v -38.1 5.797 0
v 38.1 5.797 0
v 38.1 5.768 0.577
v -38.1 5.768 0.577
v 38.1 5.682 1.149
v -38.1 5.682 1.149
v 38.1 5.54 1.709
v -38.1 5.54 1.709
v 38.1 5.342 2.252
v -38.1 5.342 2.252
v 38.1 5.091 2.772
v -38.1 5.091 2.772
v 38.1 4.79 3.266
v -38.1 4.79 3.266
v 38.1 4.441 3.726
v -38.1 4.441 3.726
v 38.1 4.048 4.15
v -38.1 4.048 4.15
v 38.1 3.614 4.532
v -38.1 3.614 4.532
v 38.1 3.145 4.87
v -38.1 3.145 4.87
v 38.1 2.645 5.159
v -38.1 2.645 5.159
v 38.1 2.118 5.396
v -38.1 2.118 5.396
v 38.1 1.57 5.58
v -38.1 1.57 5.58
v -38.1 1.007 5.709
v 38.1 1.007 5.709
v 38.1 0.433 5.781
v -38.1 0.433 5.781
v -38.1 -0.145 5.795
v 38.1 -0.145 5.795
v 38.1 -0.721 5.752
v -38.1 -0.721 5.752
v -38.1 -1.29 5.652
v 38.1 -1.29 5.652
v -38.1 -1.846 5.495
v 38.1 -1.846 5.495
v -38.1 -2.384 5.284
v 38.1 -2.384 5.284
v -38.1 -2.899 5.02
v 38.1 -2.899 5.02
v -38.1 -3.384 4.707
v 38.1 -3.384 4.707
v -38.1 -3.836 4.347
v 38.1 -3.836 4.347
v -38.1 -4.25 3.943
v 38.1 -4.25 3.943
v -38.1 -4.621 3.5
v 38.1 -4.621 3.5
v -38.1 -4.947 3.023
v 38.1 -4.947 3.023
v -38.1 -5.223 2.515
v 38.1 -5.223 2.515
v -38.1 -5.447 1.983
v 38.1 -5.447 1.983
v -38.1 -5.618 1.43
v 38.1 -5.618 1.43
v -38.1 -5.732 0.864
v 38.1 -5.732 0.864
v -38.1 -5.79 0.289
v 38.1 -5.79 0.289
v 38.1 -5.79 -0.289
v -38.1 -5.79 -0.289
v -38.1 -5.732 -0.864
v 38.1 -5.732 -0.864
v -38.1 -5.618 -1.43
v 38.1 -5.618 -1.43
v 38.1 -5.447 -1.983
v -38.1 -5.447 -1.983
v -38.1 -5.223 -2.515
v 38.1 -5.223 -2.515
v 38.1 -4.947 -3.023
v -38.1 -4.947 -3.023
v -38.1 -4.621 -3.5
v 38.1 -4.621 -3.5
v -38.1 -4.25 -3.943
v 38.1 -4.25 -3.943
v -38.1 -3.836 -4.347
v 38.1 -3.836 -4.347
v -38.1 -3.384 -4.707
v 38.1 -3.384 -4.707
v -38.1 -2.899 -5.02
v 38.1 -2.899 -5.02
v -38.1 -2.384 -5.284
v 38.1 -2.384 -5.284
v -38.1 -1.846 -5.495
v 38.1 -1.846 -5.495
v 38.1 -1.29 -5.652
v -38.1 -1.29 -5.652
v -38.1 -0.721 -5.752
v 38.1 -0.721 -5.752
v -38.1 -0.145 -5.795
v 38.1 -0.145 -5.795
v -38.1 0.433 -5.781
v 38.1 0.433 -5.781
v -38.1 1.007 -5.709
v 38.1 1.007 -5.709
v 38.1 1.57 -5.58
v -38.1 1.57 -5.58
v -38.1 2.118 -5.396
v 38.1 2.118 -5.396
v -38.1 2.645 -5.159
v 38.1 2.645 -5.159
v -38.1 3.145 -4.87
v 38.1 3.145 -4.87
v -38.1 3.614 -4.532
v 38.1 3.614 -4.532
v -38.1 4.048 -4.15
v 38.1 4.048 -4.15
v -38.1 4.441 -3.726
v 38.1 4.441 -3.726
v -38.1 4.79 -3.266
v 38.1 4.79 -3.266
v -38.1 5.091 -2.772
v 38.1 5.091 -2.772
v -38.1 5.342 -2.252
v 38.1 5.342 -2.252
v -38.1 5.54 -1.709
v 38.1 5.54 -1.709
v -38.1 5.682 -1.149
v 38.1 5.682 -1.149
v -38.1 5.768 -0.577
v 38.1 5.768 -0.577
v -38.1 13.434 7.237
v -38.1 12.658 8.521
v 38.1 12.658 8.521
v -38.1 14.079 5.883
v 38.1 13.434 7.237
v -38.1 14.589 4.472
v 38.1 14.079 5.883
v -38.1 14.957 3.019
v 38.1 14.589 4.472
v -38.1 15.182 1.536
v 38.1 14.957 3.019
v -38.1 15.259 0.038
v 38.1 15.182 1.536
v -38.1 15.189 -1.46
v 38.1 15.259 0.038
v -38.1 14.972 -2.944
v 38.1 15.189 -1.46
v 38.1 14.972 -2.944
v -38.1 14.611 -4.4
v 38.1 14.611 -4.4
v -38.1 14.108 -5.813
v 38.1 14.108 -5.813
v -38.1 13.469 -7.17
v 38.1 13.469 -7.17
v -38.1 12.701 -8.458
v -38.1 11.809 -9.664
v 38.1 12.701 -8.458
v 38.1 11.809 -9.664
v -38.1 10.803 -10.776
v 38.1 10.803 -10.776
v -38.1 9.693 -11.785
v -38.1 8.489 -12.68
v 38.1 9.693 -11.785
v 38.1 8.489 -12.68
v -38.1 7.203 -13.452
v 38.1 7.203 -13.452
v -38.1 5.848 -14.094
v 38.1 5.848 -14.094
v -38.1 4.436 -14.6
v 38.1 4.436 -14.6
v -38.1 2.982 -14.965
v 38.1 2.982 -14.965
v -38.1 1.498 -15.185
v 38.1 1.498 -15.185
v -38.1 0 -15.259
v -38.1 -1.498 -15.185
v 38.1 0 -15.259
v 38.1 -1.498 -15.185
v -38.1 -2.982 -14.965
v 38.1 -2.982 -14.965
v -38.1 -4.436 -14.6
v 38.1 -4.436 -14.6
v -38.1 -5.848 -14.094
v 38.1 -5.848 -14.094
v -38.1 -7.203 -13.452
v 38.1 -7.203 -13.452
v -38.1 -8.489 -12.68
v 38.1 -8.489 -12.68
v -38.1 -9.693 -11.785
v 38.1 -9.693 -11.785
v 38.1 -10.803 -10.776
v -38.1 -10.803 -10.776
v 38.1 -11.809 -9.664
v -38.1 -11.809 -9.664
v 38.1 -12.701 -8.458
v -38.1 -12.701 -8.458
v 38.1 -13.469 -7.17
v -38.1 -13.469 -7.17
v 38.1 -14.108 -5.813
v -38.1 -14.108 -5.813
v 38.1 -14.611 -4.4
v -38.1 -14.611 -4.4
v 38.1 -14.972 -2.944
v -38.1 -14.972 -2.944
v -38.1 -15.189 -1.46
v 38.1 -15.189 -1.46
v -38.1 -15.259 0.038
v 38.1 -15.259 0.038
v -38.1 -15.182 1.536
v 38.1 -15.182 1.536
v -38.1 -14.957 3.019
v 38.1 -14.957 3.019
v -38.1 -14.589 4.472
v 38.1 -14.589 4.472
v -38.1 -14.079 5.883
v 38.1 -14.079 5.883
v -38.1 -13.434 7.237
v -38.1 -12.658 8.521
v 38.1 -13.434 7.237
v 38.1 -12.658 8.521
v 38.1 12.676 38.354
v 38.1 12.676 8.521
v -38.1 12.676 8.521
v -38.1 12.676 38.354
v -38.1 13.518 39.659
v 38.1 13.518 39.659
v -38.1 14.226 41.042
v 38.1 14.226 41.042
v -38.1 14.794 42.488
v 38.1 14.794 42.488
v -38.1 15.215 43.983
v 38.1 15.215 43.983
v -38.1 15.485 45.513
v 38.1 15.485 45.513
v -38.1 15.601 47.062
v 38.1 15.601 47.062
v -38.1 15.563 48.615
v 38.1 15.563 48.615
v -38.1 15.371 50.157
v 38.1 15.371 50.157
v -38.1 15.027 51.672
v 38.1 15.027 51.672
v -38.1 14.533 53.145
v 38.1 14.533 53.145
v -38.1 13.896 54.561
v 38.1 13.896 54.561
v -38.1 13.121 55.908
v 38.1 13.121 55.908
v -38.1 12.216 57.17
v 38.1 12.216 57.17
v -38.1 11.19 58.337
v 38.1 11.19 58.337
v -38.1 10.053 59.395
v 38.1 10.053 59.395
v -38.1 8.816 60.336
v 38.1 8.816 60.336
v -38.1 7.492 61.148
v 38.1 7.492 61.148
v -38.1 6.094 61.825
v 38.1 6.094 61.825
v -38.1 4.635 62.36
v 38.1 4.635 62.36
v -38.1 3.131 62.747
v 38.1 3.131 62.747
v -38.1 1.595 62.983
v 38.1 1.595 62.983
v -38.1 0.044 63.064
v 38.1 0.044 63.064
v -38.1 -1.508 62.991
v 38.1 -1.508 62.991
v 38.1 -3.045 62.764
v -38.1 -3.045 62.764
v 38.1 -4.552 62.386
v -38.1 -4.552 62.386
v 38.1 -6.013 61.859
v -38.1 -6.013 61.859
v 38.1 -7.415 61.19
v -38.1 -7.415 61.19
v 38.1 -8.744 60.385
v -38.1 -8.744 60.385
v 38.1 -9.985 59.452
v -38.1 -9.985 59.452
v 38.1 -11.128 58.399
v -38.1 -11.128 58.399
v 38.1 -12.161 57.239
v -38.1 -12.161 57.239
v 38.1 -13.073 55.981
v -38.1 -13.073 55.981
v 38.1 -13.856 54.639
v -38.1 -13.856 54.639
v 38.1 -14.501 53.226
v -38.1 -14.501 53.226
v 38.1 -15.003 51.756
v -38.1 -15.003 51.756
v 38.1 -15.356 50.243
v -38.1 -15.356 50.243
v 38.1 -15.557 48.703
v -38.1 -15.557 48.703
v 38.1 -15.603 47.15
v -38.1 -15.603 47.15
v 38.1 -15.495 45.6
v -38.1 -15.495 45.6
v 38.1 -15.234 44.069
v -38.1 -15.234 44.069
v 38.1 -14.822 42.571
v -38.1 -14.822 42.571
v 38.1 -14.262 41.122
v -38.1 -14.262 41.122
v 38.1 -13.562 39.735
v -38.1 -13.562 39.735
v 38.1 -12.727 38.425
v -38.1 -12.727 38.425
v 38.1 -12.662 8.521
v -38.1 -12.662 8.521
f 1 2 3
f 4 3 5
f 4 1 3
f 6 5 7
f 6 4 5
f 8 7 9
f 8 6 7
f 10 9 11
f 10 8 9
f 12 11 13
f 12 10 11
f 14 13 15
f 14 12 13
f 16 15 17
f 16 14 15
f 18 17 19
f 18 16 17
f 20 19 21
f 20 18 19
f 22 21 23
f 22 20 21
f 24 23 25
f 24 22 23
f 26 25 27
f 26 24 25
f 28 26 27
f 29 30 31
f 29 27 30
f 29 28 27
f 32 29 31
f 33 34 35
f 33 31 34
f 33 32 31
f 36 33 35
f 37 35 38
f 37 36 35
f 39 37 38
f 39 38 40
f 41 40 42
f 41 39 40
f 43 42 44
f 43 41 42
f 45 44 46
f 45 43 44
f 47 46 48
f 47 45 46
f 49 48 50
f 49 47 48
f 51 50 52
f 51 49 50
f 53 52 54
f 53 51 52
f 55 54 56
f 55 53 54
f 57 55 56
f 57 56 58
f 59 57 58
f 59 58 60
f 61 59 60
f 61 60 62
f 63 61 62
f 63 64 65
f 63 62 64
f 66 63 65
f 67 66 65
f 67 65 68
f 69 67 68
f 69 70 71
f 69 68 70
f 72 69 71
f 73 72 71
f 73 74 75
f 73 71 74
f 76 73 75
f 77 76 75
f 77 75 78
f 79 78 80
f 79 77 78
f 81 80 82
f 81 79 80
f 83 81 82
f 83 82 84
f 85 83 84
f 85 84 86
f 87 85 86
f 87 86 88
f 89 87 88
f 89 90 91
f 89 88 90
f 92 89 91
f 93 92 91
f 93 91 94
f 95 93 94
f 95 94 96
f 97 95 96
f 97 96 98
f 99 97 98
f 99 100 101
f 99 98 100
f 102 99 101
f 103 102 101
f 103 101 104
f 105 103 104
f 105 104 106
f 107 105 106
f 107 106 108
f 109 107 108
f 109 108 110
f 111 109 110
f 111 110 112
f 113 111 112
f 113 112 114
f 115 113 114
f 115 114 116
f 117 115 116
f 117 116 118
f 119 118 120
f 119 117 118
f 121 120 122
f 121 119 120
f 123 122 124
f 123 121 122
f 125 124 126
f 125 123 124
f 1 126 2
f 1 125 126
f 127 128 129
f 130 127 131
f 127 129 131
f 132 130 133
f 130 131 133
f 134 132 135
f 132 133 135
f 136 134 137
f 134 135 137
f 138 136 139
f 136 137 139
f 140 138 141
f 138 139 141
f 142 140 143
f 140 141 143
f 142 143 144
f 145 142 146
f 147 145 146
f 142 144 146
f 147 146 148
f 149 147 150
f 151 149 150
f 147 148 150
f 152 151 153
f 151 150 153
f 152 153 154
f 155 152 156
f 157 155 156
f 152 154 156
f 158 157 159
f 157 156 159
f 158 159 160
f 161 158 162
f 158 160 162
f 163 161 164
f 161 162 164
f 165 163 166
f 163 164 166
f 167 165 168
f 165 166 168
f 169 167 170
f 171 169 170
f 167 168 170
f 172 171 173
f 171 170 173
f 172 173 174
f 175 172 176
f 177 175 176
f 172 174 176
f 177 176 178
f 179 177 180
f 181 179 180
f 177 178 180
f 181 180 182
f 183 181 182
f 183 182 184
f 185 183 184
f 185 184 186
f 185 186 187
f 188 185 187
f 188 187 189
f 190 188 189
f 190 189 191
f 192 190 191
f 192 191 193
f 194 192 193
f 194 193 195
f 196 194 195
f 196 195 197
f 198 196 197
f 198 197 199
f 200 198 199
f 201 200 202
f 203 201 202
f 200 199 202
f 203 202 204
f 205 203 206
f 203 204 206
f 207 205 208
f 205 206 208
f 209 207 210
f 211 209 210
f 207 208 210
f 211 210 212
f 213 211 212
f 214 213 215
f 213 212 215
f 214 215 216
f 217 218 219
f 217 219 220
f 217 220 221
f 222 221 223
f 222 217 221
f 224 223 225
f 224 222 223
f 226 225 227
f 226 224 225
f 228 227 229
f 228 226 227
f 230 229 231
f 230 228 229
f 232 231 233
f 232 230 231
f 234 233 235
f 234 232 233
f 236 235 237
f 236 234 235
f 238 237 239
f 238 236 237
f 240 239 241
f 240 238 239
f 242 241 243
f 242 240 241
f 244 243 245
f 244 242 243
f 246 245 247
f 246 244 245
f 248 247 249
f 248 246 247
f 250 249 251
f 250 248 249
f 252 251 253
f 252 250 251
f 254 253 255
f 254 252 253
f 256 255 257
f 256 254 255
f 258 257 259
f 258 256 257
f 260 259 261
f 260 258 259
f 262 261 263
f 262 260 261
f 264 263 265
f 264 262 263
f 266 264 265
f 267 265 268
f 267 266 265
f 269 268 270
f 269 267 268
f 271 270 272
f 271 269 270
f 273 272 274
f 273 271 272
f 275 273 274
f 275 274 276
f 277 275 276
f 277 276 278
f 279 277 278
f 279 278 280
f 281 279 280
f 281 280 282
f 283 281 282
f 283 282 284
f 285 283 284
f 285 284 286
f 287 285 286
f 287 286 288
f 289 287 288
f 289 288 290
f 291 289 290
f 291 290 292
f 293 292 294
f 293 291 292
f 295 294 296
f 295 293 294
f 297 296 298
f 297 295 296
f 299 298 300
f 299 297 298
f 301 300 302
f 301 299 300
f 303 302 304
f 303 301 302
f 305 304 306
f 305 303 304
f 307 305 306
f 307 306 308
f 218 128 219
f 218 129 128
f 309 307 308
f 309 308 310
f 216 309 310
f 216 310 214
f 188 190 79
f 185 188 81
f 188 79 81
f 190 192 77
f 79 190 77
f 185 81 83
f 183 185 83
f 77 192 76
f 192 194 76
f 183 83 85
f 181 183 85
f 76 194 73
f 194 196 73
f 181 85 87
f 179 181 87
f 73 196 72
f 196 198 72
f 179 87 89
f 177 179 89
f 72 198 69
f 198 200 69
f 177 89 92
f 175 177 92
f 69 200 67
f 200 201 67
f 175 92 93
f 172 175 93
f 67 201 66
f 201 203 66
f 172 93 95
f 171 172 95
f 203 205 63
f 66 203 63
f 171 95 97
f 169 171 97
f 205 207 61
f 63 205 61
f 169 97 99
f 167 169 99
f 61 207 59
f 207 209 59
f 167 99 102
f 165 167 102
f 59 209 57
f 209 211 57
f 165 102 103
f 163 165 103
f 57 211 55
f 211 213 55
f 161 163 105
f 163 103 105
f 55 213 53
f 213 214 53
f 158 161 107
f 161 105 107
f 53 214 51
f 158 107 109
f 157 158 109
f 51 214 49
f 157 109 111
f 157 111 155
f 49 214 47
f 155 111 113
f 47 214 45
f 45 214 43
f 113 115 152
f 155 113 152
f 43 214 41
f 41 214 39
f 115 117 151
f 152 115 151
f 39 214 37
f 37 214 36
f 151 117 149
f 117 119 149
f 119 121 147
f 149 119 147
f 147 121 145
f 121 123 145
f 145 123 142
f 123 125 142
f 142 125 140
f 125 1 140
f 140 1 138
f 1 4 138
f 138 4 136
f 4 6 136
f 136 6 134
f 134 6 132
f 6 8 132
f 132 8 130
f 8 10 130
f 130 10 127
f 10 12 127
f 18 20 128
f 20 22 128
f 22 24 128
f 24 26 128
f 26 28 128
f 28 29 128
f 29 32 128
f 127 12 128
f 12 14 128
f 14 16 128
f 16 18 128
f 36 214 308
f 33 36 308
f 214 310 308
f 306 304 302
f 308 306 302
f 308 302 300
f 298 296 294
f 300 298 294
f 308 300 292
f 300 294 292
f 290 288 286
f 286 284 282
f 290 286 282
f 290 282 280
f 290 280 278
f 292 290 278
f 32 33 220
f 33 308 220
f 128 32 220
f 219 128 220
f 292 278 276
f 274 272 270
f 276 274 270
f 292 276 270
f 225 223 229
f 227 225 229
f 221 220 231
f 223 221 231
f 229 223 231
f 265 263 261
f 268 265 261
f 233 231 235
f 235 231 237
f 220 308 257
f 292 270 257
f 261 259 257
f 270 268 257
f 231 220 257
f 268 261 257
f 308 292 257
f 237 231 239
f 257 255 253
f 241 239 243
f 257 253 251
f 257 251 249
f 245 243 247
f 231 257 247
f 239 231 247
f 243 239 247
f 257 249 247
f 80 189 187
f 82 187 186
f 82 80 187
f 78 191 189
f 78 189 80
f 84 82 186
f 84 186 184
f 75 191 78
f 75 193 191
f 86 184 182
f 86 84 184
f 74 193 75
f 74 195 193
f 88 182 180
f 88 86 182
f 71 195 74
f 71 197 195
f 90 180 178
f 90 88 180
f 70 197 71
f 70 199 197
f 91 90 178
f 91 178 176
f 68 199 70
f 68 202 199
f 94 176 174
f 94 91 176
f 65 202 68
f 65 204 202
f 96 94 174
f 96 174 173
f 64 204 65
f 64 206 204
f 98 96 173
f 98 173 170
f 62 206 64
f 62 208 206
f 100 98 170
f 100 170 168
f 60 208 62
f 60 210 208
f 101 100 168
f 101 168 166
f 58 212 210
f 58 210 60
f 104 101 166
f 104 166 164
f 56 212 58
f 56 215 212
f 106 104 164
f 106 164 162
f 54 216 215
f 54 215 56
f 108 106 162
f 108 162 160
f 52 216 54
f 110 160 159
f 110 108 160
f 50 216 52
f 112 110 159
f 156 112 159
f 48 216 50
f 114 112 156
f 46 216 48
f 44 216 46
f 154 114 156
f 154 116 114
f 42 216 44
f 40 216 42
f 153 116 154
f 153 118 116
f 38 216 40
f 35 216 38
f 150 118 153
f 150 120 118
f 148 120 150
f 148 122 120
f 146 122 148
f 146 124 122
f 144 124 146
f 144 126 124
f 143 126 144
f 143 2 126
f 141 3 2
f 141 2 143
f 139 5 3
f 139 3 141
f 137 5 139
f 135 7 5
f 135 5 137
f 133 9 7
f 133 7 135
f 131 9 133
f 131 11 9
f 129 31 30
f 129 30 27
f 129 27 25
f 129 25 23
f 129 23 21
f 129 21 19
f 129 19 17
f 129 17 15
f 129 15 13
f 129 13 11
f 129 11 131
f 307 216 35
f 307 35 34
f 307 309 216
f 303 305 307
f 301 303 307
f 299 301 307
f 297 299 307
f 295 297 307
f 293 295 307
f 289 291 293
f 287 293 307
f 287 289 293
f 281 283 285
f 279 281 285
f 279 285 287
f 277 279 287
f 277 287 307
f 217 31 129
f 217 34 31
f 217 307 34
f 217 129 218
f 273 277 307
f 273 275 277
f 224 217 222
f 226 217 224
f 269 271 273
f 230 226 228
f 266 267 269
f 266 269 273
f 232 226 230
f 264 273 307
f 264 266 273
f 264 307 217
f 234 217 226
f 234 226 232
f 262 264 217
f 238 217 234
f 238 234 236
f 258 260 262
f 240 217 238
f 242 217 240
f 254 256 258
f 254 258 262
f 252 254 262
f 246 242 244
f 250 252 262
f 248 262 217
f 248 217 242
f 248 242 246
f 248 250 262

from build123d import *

# Parameters (mm, degrees)
F0_R      = 15.2590123091
F1_DEPTH  = 38.1
F2_R      = 15.2230009986
F3_DEPTH  = 38.1
F4_DEPTH  = 38.1
F5_R      = 5.7970775931
F6_DEPTH  = 50.8
F7_DEPTH  = 101.6
F10_DEPTH = 38.1
F11_DEPTH = 38.1
F12_R     = 15.6063789954
F13_DEPTH = 38.1
F14_DEPTH = 38.1
F15_DEPTH = 38.1


with BuildPart() as f1:
    # F0 (on Right) → F1 (new body)
    with BuildSketch(Plane.YZ):
        Circle(F0_R)
    extrude(amount=F1_DEPTH)

    # F2 (on Right) → F3 (join)
    with BuildSketch(Plane.YZ):
        Circle(F2_R)
    extrude(amount=F3_DEPTH)

    # F2 (on Right) → F4 (join)
    with BuildSketch(Plane.YZ):
        Circle(F2_R)
    extrude(amount=-F4_DEPTH)

    # F5 (on Right) → F6 (join)
    with BuildSketch(Plane.YZ):
        Circle(F5_R)
    extrude(amount=-F6_DEPTH)

    # F7 (cut): a face of the model
    f7_faces = [f1.faces().sort_by_distance(p)[0] for p in [
        (-50.8, 0, 0),
    ]]
    extrude(f7_faces, amount=-F7_DEPTH, mode=Mode.SUBTRACT)

    # F9 (on Right) → F10 (join)
    with BuildSketch(Plane.YZ):
        Polygon((-12.7270547673, 38.6252403259), (-12.6615641639, 8.5206106305), (12.6757137477, 8.5206106305), (12.6757137477, 38.6252403259), align=None)
    extrude(amount=F10_DEPTH)

    # F11 (add): a face of the model
    f11_faces = [f1.faces().sort_by_distance(p)[0] for p in [
        (0, -0.0109795031, 25.7338348124),
    ]]
    extrude(f11_faces, amount=F11_DEPTH)

    # F12 (on Right) → F13 (join)
    with BuildSketch(Plane.YZ):
        with Locations((0, 47.4579036236)):
            Circle(F12_R)
    extrude(amount=F13_DEPTH)

    # F14 (add): a face of the model
    f14_faces = [f1.faces().sort_by_distance(p)[0] for p in [
        (0, 0.0002381193, 49.6663951718),
    ]]
    extrude(f14_faces, amount=-F14_DEPTH)

    # F15 (add): a face of the model
    f15_faces = [f1.faces().sort_by_distance(p)[0] for p in [
        (0, 0.0002381193, 49.6663951718),
    ]]
    extrude(f15_faces, amount=F15_DEPTH)


solid = f1.part
